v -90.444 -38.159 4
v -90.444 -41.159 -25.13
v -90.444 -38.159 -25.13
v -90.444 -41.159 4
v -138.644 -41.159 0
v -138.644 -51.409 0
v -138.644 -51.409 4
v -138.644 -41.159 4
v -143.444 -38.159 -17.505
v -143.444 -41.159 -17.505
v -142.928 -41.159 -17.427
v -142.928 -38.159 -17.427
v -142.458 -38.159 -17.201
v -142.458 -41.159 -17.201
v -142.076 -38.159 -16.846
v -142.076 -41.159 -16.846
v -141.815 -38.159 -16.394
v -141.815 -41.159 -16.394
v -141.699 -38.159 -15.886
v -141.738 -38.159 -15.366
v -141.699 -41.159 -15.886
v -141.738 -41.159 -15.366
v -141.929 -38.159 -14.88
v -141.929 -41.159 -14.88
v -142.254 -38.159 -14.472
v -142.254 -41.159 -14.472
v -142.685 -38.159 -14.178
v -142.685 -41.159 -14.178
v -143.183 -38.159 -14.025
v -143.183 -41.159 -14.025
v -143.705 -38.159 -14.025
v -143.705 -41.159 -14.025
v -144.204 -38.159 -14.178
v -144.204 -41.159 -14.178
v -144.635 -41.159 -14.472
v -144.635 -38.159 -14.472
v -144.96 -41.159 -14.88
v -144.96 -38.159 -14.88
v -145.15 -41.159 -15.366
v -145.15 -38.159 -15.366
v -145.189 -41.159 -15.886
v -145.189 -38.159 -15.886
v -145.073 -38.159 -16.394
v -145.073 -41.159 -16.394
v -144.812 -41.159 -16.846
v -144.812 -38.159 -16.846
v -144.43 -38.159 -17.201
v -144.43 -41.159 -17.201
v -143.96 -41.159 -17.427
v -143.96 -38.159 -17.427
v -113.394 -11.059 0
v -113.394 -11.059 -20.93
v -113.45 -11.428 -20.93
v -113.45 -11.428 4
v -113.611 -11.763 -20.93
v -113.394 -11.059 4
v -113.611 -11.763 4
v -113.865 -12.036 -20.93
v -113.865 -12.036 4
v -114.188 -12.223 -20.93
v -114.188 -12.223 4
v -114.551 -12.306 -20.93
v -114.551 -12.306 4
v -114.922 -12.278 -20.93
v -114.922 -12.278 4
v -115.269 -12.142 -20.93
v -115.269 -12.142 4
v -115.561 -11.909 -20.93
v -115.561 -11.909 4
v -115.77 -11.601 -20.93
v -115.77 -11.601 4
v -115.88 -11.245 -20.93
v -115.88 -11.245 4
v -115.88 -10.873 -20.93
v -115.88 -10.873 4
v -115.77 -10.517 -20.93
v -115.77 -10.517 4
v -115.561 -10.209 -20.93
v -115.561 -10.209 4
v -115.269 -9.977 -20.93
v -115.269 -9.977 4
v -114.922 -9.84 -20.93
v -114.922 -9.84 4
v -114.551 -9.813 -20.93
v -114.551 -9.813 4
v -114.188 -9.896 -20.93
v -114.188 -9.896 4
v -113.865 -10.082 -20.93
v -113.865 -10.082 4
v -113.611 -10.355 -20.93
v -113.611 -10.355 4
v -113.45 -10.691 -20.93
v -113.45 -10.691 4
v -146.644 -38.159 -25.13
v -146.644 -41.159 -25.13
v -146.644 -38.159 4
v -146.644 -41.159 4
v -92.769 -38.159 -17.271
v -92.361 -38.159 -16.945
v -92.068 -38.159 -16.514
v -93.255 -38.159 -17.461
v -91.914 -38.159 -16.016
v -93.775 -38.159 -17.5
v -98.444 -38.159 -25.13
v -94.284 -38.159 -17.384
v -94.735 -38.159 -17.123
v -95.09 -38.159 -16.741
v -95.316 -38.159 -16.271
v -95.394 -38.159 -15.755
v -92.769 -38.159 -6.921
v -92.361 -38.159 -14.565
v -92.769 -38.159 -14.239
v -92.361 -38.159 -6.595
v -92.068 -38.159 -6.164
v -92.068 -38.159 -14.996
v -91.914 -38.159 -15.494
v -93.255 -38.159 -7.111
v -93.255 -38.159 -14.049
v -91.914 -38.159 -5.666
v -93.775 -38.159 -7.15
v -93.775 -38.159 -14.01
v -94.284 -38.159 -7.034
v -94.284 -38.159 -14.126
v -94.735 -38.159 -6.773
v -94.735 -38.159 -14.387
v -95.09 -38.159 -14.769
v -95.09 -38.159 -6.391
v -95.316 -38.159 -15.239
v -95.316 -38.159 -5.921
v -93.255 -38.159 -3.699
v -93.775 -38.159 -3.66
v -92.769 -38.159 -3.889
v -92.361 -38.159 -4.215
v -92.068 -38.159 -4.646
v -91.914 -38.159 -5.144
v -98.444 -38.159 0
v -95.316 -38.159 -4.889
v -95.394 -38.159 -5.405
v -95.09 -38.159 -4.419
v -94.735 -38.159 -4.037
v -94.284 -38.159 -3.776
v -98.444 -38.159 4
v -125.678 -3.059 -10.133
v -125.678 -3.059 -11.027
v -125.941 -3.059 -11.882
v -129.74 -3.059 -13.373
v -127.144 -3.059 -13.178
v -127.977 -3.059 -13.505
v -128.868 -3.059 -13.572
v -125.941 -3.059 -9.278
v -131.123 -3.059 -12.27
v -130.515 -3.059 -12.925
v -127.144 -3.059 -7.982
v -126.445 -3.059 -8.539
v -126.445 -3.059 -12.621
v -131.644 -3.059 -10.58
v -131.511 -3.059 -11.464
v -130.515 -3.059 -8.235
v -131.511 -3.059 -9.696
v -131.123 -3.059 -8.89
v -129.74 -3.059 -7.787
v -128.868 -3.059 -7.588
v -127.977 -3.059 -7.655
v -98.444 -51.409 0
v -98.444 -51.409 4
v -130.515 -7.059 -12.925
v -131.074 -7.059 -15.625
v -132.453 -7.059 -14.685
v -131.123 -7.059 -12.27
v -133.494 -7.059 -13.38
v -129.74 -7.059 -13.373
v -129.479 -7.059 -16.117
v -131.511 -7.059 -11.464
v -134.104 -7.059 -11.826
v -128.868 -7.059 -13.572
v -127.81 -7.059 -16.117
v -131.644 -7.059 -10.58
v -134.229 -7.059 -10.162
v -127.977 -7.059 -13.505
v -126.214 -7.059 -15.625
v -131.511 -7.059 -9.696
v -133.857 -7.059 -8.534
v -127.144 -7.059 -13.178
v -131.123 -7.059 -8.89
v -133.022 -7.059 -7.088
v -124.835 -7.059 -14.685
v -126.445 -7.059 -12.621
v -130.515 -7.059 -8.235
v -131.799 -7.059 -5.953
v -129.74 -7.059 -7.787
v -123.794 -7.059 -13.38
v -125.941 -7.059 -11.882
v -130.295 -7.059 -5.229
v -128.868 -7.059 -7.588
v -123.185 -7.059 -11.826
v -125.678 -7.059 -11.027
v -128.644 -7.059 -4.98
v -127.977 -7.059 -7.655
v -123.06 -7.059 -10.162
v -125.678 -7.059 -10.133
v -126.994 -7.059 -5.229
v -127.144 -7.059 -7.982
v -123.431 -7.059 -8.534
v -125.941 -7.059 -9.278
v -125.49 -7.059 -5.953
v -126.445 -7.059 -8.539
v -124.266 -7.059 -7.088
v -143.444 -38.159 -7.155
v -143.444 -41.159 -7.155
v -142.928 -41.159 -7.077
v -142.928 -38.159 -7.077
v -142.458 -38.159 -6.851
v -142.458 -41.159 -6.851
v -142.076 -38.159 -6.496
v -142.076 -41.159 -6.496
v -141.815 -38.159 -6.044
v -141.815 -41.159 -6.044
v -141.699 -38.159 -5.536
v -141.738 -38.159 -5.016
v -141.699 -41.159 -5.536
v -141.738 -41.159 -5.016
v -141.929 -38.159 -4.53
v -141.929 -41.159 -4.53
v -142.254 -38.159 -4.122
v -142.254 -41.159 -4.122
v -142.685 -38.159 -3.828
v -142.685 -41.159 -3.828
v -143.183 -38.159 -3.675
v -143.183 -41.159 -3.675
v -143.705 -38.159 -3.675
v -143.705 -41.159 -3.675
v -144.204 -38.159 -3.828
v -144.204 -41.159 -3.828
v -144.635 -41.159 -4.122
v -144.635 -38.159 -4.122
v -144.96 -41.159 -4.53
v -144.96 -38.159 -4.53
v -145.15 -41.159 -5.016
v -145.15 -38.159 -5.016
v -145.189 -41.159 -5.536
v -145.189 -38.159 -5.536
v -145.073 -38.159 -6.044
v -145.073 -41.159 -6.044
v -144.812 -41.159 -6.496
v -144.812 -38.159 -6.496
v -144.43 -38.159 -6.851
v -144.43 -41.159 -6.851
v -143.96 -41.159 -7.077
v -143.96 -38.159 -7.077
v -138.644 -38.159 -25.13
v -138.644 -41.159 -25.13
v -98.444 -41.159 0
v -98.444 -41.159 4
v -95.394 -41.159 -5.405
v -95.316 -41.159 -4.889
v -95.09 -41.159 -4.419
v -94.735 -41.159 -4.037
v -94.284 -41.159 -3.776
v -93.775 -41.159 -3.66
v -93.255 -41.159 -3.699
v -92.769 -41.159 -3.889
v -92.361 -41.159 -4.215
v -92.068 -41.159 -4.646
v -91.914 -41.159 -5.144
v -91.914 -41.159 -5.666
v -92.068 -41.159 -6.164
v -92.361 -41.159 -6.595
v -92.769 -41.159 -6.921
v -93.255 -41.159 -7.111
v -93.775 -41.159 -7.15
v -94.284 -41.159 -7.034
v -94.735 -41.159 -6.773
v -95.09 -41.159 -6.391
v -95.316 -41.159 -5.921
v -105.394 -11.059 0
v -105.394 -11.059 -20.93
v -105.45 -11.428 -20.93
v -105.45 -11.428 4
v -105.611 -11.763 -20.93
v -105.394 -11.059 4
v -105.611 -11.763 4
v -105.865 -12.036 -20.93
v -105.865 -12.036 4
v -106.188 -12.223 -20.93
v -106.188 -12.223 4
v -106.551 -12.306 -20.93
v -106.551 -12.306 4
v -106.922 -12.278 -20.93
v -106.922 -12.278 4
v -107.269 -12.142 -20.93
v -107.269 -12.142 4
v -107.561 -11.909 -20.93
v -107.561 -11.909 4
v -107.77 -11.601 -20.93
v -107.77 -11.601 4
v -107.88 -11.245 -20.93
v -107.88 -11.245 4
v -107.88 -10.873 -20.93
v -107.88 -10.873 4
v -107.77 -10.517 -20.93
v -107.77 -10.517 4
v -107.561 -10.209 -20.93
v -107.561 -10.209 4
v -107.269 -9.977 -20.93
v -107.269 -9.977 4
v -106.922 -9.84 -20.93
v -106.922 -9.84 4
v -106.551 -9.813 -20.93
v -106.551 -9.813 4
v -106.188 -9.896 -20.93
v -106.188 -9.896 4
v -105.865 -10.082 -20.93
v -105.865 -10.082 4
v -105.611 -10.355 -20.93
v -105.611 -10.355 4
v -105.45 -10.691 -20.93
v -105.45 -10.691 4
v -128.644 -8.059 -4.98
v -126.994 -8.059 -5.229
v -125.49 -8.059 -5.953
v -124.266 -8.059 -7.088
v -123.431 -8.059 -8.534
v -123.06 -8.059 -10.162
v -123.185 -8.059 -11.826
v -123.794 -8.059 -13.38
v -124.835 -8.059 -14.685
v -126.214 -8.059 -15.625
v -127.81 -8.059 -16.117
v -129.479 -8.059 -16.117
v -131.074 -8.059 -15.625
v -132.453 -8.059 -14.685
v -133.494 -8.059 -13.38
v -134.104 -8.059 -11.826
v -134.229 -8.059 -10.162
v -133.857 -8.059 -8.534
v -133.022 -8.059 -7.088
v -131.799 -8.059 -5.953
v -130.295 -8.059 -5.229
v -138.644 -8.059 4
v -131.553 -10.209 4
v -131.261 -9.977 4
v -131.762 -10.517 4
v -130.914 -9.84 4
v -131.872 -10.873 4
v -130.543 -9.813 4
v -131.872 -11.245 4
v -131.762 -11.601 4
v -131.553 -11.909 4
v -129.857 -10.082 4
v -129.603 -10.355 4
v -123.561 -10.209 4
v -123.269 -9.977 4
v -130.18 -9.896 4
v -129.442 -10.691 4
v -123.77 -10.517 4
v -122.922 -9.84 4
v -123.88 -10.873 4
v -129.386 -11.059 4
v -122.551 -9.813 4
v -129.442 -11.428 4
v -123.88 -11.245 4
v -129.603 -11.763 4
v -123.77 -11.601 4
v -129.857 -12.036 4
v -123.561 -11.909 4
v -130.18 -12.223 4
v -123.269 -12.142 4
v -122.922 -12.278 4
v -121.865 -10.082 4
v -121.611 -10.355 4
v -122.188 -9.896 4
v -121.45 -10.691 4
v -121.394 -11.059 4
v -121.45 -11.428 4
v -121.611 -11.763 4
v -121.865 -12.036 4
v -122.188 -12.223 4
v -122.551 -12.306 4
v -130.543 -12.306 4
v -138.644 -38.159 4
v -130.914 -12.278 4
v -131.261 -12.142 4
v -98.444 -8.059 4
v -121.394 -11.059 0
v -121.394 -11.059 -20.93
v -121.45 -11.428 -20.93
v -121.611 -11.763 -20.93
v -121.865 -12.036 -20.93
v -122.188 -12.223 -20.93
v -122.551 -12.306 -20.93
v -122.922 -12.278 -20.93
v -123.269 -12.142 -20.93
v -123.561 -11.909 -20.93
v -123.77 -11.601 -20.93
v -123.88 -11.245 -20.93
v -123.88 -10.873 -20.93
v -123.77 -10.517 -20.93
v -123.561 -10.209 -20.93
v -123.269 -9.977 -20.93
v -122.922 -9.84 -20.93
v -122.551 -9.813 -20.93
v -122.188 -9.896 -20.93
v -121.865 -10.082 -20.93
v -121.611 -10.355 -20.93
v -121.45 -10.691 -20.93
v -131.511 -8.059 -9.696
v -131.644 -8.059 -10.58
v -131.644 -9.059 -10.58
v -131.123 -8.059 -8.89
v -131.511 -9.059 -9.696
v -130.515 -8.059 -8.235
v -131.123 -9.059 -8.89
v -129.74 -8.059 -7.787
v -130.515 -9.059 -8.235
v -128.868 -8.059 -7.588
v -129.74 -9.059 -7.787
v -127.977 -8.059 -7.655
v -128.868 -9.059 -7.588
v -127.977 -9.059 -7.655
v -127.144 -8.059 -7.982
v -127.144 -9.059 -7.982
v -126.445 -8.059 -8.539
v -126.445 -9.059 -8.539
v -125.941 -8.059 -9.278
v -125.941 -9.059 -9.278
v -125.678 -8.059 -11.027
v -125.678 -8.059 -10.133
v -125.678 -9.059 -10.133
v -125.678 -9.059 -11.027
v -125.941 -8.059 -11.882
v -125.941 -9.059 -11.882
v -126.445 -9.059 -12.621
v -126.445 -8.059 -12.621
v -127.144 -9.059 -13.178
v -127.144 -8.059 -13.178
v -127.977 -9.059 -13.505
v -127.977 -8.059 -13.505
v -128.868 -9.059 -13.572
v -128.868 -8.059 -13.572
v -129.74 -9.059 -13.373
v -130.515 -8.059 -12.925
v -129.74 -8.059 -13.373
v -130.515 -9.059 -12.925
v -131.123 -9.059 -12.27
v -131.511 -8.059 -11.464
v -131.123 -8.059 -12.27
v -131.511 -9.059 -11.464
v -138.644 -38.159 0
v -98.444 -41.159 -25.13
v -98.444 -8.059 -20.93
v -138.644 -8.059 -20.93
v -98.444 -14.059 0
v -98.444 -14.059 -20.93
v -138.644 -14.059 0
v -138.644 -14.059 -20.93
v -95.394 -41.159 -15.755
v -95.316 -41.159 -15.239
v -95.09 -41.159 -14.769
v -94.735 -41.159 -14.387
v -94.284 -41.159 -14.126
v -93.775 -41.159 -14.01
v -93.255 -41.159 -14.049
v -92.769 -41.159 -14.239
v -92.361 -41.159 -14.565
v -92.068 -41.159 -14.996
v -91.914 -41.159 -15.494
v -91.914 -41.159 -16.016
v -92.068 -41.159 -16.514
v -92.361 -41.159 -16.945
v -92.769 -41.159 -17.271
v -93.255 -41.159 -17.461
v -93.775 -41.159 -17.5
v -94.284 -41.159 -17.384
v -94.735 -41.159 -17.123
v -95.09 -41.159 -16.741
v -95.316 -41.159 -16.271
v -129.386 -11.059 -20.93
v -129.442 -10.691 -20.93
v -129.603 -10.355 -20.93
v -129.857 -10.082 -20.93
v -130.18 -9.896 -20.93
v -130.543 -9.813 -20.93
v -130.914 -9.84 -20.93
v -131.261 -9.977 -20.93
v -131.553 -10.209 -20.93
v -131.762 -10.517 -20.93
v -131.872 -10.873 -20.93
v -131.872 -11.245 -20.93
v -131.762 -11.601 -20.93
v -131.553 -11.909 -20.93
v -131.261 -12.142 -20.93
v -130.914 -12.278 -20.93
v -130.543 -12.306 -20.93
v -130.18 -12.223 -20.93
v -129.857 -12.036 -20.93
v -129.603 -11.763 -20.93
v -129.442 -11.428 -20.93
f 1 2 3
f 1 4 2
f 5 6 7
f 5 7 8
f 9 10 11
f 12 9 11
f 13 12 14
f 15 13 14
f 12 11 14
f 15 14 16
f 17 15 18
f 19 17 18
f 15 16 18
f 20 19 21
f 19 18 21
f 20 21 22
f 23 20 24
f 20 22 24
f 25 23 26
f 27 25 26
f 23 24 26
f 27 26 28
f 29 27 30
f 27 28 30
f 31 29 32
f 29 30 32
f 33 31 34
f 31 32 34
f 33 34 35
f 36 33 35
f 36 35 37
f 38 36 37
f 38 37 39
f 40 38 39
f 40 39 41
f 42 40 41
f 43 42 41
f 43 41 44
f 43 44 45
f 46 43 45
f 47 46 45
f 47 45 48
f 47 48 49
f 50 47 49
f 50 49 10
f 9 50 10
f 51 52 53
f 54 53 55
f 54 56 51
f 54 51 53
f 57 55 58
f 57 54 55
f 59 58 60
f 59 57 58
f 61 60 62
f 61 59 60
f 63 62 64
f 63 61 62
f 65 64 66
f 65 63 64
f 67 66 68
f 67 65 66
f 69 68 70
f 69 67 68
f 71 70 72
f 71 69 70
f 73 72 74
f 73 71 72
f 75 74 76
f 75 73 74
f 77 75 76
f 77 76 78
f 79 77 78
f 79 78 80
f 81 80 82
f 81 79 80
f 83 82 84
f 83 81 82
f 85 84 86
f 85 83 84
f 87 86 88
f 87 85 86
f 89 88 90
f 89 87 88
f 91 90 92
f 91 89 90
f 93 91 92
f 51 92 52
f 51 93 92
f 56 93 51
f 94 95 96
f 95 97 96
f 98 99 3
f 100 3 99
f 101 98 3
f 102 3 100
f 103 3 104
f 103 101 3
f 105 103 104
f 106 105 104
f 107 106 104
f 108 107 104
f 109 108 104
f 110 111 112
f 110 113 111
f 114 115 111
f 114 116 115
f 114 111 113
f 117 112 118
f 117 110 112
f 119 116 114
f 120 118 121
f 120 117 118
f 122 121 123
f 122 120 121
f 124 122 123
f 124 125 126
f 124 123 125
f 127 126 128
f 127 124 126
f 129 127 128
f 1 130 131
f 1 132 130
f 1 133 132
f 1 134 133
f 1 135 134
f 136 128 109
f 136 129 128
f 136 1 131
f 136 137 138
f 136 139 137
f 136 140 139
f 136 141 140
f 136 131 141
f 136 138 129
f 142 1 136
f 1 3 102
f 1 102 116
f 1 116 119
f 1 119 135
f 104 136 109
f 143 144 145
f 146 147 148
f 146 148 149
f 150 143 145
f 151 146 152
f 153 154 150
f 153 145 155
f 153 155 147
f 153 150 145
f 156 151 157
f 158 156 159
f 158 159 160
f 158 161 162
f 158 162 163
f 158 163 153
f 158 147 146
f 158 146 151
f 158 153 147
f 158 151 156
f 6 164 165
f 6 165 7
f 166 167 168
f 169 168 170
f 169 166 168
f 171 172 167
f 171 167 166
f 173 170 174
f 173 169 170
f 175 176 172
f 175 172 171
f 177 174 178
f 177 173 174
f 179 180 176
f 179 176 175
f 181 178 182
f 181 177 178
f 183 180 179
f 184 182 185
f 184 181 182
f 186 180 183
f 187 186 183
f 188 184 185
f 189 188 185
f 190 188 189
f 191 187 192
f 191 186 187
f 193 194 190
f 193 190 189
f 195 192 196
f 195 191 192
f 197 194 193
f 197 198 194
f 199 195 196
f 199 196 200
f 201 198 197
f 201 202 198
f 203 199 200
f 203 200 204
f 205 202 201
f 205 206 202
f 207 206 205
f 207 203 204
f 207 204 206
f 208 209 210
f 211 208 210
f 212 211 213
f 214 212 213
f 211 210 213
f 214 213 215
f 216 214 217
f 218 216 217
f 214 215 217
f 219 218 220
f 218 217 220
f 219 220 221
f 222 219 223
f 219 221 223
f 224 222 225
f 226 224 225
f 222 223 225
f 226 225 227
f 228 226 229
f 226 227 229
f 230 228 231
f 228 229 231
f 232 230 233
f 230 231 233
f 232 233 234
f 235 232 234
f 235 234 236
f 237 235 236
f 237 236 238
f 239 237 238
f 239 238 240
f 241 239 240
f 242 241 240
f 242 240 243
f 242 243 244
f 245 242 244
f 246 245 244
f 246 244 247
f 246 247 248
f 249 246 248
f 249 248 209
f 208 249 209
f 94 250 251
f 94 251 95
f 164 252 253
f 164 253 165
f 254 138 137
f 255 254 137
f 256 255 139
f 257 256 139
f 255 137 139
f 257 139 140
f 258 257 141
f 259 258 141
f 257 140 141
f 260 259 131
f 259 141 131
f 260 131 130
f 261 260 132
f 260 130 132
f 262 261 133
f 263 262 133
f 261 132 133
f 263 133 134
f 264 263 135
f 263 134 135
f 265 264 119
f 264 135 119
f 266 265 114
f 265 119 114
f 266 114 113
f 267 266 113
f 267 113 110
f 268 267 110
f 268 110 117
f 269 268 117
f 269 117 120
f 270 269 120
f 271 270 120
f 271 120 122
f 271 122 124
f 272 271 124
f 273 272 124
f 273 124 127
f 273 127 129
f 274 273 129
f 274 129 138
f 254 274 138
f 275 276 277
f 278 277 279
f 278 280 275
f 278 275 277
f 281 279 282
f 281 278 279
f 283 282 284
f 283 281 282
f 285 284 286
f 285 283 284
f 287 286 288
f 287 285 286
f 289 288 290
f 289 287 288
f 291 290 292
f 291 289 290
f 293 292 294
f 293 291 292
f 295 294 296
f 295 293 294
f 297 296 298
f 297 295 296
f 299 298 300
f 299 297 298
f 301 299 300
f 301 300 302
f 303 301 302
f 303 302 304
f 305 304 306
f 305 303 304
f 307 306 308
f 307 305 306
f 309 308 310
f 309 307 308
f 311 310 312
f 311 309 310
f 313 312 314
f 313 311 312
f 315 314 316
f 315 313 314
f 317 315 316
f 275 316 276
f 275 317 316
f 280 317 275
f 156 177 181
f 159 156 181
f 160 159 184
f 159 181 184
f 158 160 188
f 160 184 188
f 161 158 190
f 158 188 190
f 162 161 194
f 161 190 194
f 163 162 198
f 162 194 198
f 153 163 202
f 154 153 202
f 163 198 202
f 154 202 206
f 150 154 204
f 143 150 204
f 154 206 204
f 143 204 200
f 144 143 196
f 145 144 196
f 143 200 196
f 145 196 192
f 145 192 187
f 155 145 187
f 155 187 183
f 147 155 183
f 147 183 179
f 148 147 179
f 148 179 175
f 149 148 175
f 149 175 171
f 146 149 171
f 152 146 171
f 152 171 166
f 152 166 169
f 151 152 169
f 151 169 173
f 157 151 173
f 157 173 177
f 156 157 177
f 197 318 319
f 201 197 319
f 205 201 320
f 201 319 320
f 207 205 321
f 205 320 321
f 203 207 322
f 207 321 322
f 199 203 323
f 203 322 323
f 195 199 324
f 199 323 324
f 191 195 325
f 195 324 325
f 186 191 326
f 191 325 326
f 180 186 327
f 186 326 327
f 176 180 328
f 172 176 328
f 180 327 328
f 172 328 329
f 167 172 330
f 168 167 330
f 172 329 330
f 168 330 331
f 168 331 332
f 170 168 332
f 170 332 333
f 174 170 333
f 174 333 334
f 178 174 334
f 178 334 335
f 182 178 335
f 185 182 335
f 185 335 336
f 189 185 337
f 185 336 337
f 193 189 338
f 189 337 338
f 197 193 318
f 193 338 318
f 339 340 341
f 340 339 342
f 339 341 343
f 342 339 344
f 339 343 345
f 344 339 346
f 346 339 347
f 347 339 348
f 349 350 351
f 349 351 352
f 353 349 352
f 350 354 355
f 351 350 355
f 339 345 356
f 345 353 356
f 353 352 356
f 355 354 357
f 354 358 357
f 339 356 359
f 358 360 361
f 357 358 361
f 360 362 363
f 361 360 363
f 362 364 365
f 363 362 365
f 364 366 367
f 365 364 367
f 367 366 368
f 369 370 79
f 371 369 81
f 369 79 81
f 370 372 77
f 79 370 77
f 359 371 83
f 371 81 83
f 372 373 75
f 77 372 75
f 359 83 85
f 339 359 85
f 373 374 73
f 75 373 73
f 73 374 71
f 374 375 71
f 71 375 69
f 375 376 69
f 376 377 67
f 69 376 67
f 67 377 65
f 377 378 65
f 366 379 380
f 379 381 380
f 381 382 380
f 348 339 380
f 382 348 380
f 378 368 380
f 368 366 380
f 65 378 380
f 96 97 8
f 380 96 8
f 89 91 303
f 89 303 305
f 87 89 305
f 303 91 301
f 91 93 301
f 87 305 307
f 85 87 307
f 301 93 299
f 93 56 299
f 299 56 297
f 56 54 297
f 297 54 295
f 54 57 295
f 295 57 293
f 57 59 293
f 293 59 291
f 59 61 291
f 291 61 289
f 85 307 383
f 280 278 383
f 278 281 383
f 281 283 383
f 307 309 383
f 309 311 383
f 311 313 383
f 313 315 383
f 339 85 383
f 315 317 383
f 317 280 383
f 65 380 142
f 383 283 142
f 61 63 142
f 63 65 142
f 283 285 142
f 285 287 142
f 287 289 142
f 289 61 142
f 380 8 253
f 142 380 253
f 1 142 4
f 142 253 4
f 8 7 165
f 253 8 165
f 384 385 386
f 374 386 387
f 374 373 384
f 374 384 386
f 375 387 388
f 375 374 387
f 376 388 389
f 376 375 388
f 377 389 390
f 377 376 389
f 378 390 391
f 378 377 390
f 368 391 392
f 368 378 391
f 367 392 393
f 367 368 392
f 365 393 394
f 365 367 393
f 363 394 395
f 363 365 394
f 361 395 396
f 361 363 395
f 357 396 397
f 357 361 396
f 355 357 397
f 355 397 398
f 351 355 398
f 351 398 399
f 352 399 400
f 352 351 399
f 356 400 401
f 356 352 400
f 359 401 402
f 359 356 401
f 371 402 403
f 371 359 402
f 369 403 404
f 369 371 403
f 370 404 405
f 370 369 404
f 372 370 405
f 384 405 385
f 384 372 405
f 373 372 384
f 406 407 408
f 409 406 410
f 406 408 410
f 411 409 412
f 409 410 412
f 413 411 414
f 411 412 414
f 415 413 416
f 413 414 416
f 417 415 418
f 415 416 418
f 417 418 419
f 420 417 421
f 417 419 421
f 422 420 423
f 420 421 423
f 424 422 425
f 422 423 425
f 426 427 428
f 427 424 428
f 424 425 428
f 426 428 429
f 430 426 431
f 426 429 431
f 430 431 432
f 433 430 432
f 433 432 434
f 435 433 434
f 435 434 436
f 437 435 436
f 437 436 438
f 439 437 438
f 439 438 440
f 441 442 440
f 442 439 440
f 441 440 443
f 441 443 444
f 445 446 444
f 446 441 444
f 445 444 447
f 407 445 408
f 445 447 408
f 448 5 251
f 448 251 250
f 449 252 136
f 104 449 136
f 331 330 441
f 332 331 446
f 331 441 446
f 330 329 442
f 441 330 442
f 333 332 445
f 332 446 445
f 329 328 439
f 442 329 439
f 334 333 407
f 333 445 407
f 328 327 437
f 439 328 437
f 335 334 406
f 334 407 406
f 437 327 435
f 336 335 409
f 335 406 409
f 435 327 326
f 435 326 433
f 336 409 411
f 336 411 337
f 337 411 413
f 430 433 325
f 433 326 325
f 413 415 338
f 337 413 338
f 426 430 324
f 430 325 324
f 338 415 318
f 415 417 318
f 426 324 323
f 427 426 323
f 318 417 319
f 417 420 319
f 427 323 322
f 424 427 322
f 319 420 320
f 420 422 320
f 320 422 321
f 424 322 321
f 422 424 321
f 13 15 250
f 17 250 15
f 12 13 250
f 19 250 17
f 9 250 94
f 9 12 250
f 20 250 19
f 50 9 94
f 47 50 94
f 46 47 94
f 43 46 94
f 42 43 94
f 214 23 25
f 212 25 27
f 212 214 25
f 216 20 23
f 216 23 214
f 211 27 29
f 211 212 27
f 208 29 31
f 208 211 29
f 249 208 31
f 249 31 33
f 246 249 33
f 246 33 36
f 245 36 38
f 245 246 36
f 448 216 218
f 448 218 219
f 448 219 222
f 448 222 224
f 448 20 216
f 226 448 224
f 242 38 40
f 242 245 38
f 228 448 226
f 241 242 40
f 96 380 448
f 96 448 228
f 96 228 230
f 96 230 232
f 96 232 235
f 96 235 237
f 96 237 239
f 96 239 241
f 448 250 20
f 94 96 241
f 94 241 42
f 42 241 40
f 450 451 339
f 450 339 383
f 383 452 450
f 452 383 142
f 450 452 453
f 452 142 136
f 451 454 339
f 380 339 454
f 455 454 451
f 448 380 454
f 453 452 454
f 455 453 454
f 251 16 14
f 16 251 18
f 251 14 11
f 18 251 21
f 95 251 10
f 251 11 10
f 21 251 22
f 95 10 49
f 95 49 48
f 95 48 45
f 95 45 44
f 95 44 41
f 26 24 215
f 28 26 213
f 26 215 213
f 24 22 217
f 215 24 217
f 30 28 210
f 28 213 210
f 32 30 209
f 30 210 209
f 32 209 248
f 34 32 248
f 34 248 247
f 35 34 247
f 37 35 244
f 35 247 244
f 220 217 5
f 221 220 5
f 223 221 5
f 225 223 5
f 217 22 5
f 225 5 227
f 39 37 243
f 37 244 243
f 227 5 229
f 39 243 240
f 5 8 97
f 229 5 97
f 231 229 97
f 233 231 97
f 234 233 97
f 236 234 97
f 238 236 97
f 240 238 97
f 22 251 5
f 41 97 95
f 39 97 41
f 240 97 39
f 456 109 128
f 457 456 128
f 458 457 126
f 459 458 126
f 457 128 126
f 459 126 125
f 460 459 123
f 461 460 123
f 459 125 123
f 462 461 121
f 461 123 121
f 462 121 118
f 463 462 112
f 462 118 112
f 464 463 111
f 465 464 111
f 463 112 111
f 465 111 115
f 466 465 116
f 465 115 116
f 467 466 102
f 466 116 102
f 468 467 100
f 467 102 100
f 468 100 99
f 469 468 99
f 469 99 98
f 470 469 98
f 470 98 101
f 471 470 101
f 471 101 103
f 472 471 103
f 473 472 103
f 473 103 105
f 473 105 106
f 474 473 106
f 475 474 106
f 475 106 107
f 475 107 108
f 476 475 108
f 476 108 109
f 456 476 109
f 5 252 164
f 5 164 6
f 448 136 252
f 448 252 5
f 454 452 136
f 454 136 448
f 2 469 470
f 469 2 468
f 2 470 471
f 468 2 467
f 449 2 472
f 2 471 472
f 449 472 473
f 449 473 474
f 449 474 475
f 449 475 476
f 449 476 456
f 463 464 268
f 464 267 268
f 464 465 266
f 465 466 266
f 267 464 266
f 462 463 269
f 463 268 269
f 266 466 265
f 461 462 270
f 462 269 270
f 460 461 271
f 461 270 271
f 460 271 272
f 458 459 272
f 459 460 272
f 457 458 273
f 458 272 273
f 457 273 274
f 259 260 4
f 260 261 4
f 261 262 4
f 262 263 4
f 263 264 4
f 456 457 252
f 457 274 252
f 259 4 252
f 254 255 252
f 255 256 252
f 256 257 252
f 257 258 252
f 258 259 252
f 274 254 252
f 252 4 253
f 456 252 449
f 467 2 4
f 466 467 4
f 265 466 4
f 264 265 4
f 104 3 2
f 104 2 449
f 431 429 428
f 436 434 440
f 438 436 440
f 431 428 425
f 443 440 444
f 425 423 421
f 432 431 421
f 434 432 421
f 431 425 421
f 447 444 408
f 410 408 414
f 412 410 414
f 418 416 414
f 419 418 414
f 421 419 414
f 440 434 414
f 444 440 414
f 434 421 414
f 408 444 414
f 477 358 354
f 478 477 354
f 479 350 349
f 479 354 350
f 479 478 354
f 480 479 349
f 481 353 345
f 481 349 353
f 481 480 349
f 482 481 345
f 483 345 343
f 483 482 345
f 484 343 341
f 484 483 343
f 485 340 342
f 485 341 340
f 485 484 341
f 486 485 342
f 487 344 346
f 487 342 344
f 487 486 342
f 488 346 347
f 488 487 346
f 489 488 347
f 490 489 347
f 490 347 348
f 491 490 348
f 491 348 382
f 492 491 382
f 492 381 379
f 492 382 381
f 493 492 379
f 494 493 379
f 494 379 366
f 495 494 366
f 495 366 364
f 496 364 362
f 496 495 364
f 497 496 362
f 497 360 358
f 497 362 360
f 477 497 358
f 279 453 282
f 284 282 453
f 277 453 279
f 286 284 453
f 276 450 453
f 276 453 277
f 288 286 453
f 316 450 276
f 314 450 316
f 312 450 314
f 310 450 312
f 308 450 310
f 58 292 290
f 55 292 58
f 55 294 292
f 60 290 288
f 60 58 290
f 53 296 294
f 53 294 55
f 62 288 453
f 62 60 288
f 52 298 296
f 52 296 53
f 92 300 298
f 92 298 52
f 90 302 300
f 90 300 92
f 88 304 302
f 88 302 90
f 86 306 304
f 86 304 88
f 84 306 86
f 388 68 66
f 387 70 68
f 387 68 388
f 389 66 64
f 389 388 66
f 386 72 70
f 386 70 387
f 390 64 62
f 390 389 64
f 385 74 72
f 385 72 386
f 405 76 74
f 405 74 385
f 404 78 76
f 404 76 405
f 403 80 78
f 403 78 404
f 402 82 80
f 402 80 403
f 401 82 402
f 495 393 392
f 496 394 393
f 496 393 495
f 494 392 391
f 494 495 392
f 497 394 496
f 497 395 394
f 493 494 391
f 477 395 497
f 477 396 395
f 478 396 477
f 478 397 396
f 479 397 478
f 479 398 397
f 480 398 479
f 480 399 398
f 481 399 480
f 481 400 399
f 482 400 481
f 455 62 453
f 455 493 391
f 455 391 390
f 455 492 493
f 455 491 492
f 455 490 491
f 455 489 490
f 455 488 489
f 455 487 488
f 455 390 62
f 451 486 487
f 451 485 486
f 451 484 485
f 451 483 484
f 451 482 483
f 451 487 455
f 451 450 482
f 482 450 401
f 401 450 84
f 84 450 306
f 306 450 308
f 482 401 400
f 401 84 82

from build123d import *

# Parameters (mm, degrees)
BOSS_EXTRUDE2_DEPTH       = 4
SKETCH6_W                 = 8
SKETCH6_H                 = 3
BOSS_EXTRUDE3_DEPTH       = 25.13
SKETCH7_W                 = 8
SKETCH7_H                 = 3
BOSS_EXTRUDE4_DEPTH       = 25.13
SKETCH32_W                = 40.2
SKETCH32_H                = 6
BOSS_EXTRUDE6_DEPTH       = 20.93
SKETCH33_R                = 3.5
BOSS_EXTRUDE9_DEPTH       = 5.05
SKETCH63_R                = 5.6
BOSS_EXTRUDE16_DEPTH      = 1
SKETCH70_R                = 1.75
CUT_EXTRUDE23_DEPTH       = 5
SKETCH71_R                = 1.75
CUT_EXTRUDE24_DEPTH       = 6
CUT_EXTRUDE26_DEPTH       = 10
CUT_EXTRUDE26_DEPTH_BACK  = 25
SKETCH86_R                = 1.25
SKETCH88_W                = 40.2
SKETCH88_H                = 4
BOSS_EXTRUDE26_DEPTH      = 6
CUT_EXTRUDE28_DEPTH       = 4
CUT_EXTRUDE28_DEPTH_BACK  = 30
SKETCH89_R                = 1.25
BOSS_EXTRUDE27_DEPTH      = 4
BOSS_EXTRUDE27_DEPTH_BACK = 2
SKETCH90_R                = 3


with BuildPart() as part:
    # Sketch5 → Boss-Extrude2 (new body)
    with BuildSketch(Plane.XY):
        Polygon((-138.644230049, -41.159116495), (-138.644230049, -51.409116495), (-98.444230049, -51.409116495), (-98.444230049, -41.159116495), (-90.444230049, -41.159116495), (-90.444230049, -38.159116495), (-98.444230049, -38.159116495), (-98.444230049, -14.059116495), (-138.644230049, -14.059116495), (-138.644230049, -38.159116495), (-146.644230049, -38.159116495), (-146.644230049, -41.159116495), align=None)
    extrude(amount=BOSS_EXTRUDE2_DEPTH)

    # Sketch6 → Boss-Extrude3 (add)
    with BuildSketch(Plane(origin=(0, 0, 0), x_dir=(-1, 0, 0), z_dir=(0, 0, -1))):
        with Locations((142.644230049, -39.659116495)):
            Rectangle(SKETCH6_W, SKETCH6_H)
    extrude(amount=BOSS_EXTRUDE3_DEPTH)

    # Sketch7 → Boss-Extrude4 (add)
    with BuildSketch(Plane(origin=(0, 0, 0), x_dir=(-1, 0, 0), z_dir=(0, 0, -1))):
        with Locations((94.444230049, -39.659116495)):
            Rectangle(SKETCH7_W, SKETCH7_H)
    extrude(amount=BOSS_EXTRUDE4_DEPTH)

    # Sketch70 → Cut-Extrude23 (cut)
    with BuildSketch(Plane(origin=(0, -38.159116495, 0), x_dir=(1, 0, 0), z_dir=(0, 1, 0))):
        with Locations((-93.644230062, 15.755)):
            Circle(SKETCH70_R)
        with Locations((-93.644230062, 5.405)):
            Circle(SKETCH70_R)
    extrude(amount=-CUT_EXTRUDE23_DEPTH, mode=Mode.SUBTRACT)

    # Sketch71 → Cut-Extrude24 (cut)
    with BuildSketch(Plane(origin=(0, -41.159116495, 0), x_dir=(-1, 0, 0), z_dir=(0, -1, 0))):
        with Locations((143.444230049, 15.755)):
            Circle(SKETCH71_R)
        with Locations((143.444230049, 5.405)):
            Circle(SKETCH71_R)
    extrude(amount=-CUT_EXTRUDE24_DEPTH, mode=Mode.SUBTRACT)



with BuildPart() as body_2:
    # Sketch32 → Boss-Extrude6 (new body)
    with BuildSketch(Plane(origin=(0, 0, 0), x_dir=(-1, 0, 0), z_dir=(0, 0, -1))):
        with Locations((118.544230049, -11.059116495)):
            Rectangle(SKETCH32_W, SKETCH32_H)
    extrude(amount=BOSS_EXTRUDE6_DEPTH)

    # Sketch33 → Boss-Extrude9 (add)
    with BuildSketch(Plane(origin=(0.053304524, -14.059116495, 0), x_dir=(1, 0, 0), z_dir=(0, 1, 0))):
        with Locations((-128.616195309, 10.145060344)):
            Circle(SKETCH33_R)
    extrude(amount=BOSS_EXTRUDE9_DEPTH)

    # Sketch86 → Cut-Extrude26 (cut, two sides: drawn at the far end of the back side and taken through both)
    with BuildSketch(Plane(origin=(0, 0, -20.93), x_dir=(-1, 0, 0), z_dir=(0, 0, -1)).offset(-CUT_EXTRUDE26_DEPTH_BACK)):
        with Locations((122.644230049, -11.0591165)):
            Circle(SKETCH86_R)
        with Locations((114.644230049, -11.0591165)):
            Circle(SKETCH86_R)
        with Locations((106.644230049, -11.0591165)):
            Circle(SKETCH86_R)
    extrude(amount=CUT_EXTRUDE26_DEPTH + CUT_EXTRUDE26_DEPTH_BACK, mode=Mode.SUBTRACT)


with BuildPart() as body_3:
    # Sketch63 → Boss-Extrude16 (new body)
    with BuildSketch(Plane(origin=(0.038379059, -8.059116495, 0), x_dir=(1, 0, 0), z_dir=(0, 1, 0))):
        with Locations((-128.682609121, 10.58)):
            Circle(SKETCH63_R)
    extrude(amount=BOSS_EXTRUDE16_DEPTH)

    # Sketch90 → Boss-Extrude27 (add, two sides: drawn at the far end of the back side and taken through both)
    with BuildSketch(Plane(origin=(0, -7.059116495, 0), x_dir=(1, 0, 0), z_dir=(0, 1, 0)).offset(-BOSS_EXTRUDE27_DEPTH_BACK)):
        with Locations((-128.644230062, 10.58)):
            Circle(SKETCH90_R)
    extrude(amount=BOSS_EXTRUDE27_DEPTH + BOSS_EXTRUDE27_DEPTH_BACK)


with BuildPart() as part_1:
    add(part.part)

    add(body_2.part)  # Boss-Extrude26 merges body 2
    # Sketch88 → Boss-Extrude26 (add)
    with BuildSketch(Plane(origin=(0, -14.059116495, 0), x_dir=(1, 0, 0), z_dir=(0, 1, 0))):
        with Locations((-118.544230049, -2)):
            Rectangle(SKETCH88_W, SKETCH88_H)
    extrude(amount=BOSS_EXTRUDE26_DEPTH)

    # Sketch89 → Cut-Extrude28 (cut, two sides: drawn at the far end of the back side and taken through both)
    with BuildSketch(Plane.XY.offset(4).offset(-CUT_EXTRUDE28_DEPTH_BACK)):
        with Locations((-130.636250743, -11.059116495)):
            Circle(SKETCH89_R)
        with Locations((-122.644230049, -11.059116495)):
            Circle(SKETCH89_R)
        with Locations((-114.644230049, -11.059116495)):
            Circle(SKETCH89_R)
        with Locations((-106.644230049, -11.059116495)):
            Circle(SKETCH89_R)
    extrude(amount=CUT_EXTRUDE28_DEPTH + CUT_EXTRUDE28_DEPTH_BACK, mode=Mode.SUBTRACT)


solid = Compound([body_3.part, part_1.part])
